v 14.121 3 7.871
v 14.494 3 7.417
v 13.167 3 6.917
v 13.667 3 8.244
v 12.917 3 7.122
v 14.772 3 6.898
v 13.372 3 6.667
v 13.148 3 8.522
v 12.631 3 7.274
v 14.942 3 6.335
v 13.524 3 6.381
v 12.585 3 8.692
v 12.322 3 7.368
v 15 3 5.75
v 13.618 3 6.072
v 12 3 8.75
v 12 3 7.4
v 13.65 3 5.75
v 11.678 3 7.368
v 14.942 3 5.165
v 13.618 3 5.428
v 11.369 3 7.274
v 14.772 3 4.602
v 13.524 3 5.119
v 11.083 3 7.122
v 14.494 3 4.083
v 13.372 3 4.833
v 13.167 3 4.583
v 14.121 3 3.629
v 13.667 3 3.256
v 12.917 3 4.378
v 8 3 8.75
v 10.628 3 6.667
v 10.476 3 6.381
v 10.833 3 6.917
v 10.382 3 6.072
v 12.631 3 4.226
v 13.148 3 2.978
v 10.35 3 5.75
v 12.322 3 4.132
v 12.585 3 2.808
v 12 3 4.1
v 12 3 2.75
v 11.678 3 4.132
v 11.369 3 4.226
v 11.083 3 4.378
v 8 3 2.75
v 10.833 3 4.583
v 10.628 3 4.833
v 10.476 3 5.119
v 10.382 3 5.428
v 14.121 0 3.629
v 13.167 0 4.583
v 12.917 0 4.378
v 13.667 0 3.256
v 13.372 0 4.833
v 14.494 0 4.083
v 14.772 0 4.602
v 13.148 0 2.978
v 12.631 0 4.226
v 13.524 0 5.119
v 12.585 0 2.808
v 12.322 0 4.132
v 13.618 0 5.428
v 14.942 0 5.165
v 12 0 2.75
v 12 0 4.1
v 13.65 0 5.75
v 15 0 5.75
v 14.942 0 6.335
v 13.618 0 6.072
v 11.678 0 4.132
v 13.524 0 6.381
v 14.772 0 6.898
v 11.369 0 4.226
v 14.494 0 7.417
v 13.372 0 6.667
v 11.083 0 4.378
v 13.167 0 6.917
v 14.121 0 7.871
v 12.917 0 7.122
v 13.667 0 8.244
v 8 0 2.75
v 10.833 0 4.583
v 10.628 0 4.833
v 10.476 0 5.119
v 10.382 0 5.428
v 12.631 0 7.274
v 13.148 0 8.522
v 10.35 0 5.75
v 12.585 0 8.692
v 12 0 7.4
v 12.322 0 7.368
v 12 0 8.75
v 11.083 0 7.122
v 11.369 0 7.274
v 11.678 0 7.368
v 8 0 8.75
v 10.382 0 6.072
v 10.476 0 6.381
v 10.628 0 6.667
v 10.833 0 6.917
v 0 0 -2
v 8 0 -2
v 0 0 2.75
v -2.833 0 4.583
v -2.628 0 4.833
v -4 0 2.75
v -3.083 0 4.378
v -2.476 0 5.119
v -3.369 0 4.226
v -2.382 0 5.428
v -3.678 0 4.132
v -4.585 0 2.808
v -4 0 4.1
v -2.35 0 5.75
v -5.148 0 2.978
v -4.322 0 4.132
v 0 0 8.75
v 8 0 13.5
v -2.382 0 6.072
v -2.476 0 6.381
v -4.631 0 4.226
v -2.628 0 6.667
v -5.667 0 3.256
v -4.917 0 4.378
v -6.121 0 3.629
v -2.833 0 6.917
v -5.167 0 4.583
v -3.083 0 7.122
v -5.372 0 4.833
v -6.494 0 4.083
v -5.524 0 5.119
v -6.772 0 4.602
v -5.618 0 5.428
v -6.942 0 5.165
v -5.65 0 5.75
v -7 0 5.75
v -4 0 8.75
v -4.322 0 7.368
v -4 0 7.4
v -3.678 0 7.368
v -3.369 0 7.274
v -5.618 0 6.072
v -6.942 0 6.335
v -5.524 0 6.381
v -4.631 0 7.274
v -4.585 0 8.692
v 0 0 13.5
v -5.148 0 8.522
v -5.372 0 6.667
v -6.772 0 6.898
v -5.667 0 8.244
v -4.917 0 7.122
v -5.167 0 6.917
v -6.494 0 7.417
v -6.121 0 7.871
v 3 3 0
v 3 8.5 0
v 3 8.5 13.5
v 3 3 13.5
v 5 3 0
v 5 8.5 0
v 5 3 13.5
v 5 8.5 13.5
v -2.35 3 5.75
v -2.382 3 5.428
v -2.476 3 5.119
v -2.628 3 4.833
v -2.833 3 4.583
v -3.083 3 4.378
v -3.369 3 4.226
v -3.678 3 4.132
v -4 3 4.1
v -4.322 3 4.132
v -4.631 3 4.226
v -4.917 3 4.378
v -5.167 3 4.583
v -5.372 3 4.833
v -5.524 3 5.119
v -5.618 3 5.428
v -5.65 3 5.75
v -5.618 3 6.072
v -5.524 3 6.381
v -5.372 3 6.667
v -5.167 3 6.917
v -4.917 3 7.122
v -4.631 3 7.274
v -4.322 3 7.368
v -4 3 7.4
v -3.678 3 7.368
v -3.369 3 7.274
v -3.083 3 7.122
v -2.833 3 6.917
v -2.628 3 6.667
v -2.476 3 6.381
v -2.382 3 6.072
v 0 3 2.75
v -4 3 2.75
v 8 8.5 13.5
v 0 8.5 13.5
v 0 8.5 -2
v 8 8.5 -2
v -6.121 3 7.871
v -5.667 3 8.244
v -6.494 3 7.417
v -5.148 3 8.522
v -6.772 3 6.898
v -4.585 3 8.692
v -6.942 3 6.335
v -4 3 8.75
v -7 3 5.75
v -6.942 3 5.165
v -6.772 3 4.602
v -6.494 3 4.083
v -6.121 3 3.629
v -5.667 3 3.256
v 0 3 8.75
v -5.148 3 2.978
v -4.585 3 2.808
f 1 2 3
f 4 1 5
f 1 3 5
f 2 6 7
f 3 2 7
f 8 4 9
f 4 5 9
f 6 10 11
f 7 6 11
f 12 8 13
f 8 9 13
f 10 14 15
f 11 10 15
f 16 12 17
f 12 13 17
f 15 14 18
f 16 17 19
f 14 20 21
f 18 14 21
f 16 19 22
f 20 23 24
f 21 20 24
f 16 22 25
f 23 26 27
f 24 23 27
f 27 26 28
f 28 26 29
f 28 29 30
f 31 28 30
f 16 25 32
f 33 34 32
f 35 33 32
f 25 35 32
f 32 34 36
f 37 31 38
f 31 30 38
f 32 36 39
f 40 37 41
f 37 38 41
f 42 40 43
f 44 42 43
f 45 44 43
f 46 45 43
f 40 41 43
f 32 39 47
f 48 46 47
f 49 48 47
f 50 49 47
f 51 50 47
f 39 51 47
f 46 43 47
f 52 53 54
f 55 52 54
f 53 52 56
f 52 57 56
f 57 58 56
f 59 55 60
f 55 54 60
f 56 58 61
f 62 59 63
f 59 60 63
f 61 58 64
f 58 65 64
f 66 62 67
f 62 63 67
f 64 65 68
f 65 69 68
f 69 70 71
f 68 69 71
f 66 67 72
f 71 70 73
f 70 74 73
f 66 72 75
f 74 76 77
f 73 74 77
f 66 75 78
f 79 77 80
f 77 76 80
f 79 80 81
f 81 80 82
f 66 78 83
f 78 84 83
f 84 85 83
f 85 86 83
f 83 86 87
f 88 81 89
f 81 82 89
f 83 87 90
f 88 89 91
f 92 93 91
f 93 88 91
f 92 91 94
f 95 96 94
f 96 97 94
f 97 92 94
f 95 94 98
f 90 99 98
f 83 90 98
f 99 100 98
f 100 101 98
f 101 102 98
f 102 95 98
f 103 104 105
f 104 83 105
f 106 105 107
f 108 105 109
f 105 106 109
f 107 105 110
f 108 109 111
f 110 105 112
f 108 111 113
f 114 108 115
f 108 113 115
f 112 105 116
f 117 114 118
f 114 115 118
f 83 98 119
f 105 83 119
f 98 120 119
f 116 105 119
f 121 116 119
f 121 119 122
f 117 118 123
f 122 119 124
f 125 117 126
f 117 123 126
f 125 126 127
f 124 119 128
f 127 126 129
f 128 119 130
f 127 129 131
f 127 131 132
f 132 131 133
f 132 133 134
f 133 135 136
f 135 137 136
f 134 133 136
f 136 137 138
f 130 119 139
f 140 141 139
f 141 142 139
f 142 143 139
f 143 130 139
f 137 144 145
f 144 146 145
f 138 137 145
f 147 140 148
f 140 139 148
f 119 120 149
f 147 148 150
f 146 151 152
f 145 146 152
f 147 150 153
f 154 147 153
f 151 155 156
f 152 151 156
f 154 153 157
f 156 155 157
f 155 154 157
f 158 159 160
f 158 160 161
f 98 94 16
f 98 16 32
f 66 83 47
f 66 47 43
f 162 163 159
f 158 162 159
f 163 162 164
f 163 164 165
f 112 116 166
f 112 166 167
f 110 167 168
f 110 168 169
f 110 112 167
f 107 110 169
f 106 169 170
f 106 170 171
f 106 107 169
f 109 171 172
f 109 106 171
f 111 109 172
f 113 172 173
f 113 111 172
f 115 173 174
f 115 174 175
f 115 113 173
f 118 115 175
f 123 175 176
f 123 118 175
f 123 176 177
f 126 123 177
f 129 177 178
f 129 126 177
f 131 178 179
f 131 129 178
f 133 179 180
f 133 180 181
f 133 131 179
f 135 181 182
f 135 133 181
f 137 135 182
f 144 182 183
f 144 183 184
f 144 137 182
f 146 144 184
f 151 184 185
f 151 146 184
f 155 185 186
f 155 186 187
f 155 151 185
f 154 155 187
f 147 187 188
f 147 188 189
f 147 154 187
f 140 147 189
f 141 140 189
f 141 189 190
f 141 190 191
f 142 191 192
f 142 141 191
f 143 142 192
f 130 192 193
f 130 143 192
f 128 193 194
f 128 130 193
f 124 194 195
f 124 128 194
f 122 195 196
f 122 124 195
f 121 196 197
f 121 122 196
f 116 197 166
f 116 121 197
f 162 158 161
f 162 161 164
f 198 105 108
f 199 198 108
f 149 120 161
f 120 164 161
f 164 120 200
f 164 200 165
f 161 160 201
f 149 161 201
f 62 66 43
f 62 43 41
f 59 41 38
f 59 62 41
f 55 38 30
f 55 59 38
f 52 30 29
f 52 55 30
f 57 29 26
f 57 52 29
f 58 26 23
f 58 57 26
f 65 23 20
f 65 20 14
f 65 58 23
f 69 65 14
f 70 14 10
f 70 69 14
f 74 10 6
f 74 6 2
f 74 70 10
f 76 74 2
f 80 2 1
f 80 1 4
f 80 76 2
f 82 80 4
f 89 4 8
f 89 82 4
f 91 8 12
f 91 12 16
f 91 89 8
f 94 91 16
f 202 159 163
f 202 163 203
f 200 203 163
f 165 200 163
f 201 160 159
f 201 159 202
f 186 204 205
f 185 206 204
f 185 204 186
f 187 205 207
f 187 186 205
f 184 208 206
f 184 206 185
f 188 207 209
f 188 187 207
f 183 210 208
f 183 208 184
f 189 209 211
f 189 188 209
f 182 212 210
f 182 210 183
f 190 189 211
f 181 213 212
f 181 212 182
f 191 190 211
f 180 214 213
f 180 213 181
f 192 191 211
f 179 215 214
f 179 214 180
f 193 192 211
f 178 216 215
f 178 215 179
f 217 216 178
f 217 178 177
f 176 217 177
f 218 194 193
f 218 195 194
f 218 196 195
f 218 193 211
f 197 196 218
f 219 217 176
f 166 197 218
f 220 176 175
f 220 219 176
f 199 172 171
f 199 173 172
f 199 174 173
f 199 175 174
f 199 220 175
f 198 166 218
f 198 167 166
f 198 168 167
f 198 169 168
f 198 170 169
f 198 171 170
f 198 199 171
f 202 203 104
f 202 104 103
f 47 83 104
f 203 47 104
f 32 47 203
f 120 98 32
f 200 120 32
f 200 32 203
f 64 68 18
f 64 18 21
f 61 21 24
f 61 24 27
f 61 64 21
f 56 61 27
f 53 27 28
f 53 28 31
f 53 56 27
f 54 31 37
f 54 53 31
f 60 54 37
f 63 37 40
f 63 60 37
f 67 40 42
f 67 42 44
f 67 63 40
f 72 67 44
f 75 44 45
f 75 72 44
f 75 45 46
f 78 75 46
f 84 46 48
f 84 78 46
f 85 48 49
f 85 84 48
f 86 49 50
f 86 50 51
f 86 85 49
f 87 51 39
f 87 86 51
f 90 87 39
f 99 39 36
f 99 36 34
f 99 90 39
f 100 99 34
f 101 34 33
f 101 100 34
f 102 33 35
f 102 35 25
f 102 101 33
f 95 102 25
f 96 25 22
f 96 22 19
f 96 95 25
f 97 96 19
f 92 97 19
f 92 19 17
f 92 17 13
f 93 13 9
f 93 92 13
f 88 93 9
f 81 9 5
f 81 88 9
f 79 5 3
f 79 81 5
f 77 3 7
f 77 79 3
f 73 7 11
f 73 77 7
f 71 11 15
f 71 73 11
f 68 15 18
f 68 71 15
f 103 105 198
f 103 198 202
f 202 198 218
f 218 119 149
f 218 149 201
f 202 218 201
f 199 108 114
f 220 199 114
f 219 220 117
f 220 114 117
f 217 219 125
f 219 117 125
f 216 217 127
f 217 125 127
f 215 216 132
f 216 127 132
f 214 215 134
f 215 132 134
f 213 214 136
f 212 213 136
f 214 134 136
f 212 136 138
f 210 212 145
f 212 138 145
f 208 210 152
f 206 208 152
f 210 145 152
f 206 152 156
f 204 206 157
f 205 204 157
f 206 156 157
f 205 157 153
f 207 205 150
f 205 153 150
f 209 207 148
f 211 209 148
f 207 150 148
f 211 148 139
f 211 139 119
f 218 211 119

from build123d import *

# Parameters (mm, degrees)
BOSS_EXTRUDE1_DEPTH = 13.5
SKETCH2_W           = 8
SKETCH2_H           = 8.5
BOSS_EXTRUDE2_DEPTH = 2
SKETCH3_R           = 1.65
BOSS_EXTRUDE3_DEPTH = 3


with BuildPart() as part:
    # Sketch1 → Boss-Extrude1 (new body)
    with BuildSketch(Plane.XY):
        Polygon((0, 0), (0, 8.5), (3, 8.5), (3, 3), (5, 3), (5, 8.5), (8, 8.5), (8, 0), align=None)
    extrude(amount=BOSS_EXTRUDE1_DEPTH)

    # Sketch2 → Boss-Extrude2 (add)
    with BuildSketch(Plane(origin=(0, 0, 0), x_dir=(-1, 0, 0), z_dir=(0, 0, -1))):
        with Locations((-4, 4.25)):
            Rectangle(SKETCH2_W, SKETCH2_H)
    extrude(amount=BOSS_EXTRUDE2_DEPTH)

    # Sketch3 → Boss-Extrude3 (add)
    with BuildSketch(Plane(origin=(0, 0, 0), x_dir=(1, 0, 0), z_dir=(0, 1, 0))):
        with BuildLine():
            Line((0, -2.75), (-4, -2.75))
            ThreePointArc((-4, -2.75), (-7, -5.75), (-4, -8.75))
            Line((-4, -8.75), (0, -8.75))
            Line((0, -8.75), (0, -2.75))
        make_face()
        with Locations((-4, -5.75)):
            Circle(SKETCH3_R, mode=Mode.SUBTRACT)
        with BuildLine():
            Line((8, -2.75), (12, -2.75))
            ThreePointArc((12, -2.75), (15, -5.75), (12, -8.75))
            Line((12, -8.75), (8, -8.75))
            Line((8, -8.75), (8, -2.75))
        make_face()
        with Locations((12, -5.75)):
            Circle(SKETCH3_R, mode=Mode.SUBTRACT)
    extrude(amount=BOSS_EXTRUDE3_DEPTH)


solid = part.part
